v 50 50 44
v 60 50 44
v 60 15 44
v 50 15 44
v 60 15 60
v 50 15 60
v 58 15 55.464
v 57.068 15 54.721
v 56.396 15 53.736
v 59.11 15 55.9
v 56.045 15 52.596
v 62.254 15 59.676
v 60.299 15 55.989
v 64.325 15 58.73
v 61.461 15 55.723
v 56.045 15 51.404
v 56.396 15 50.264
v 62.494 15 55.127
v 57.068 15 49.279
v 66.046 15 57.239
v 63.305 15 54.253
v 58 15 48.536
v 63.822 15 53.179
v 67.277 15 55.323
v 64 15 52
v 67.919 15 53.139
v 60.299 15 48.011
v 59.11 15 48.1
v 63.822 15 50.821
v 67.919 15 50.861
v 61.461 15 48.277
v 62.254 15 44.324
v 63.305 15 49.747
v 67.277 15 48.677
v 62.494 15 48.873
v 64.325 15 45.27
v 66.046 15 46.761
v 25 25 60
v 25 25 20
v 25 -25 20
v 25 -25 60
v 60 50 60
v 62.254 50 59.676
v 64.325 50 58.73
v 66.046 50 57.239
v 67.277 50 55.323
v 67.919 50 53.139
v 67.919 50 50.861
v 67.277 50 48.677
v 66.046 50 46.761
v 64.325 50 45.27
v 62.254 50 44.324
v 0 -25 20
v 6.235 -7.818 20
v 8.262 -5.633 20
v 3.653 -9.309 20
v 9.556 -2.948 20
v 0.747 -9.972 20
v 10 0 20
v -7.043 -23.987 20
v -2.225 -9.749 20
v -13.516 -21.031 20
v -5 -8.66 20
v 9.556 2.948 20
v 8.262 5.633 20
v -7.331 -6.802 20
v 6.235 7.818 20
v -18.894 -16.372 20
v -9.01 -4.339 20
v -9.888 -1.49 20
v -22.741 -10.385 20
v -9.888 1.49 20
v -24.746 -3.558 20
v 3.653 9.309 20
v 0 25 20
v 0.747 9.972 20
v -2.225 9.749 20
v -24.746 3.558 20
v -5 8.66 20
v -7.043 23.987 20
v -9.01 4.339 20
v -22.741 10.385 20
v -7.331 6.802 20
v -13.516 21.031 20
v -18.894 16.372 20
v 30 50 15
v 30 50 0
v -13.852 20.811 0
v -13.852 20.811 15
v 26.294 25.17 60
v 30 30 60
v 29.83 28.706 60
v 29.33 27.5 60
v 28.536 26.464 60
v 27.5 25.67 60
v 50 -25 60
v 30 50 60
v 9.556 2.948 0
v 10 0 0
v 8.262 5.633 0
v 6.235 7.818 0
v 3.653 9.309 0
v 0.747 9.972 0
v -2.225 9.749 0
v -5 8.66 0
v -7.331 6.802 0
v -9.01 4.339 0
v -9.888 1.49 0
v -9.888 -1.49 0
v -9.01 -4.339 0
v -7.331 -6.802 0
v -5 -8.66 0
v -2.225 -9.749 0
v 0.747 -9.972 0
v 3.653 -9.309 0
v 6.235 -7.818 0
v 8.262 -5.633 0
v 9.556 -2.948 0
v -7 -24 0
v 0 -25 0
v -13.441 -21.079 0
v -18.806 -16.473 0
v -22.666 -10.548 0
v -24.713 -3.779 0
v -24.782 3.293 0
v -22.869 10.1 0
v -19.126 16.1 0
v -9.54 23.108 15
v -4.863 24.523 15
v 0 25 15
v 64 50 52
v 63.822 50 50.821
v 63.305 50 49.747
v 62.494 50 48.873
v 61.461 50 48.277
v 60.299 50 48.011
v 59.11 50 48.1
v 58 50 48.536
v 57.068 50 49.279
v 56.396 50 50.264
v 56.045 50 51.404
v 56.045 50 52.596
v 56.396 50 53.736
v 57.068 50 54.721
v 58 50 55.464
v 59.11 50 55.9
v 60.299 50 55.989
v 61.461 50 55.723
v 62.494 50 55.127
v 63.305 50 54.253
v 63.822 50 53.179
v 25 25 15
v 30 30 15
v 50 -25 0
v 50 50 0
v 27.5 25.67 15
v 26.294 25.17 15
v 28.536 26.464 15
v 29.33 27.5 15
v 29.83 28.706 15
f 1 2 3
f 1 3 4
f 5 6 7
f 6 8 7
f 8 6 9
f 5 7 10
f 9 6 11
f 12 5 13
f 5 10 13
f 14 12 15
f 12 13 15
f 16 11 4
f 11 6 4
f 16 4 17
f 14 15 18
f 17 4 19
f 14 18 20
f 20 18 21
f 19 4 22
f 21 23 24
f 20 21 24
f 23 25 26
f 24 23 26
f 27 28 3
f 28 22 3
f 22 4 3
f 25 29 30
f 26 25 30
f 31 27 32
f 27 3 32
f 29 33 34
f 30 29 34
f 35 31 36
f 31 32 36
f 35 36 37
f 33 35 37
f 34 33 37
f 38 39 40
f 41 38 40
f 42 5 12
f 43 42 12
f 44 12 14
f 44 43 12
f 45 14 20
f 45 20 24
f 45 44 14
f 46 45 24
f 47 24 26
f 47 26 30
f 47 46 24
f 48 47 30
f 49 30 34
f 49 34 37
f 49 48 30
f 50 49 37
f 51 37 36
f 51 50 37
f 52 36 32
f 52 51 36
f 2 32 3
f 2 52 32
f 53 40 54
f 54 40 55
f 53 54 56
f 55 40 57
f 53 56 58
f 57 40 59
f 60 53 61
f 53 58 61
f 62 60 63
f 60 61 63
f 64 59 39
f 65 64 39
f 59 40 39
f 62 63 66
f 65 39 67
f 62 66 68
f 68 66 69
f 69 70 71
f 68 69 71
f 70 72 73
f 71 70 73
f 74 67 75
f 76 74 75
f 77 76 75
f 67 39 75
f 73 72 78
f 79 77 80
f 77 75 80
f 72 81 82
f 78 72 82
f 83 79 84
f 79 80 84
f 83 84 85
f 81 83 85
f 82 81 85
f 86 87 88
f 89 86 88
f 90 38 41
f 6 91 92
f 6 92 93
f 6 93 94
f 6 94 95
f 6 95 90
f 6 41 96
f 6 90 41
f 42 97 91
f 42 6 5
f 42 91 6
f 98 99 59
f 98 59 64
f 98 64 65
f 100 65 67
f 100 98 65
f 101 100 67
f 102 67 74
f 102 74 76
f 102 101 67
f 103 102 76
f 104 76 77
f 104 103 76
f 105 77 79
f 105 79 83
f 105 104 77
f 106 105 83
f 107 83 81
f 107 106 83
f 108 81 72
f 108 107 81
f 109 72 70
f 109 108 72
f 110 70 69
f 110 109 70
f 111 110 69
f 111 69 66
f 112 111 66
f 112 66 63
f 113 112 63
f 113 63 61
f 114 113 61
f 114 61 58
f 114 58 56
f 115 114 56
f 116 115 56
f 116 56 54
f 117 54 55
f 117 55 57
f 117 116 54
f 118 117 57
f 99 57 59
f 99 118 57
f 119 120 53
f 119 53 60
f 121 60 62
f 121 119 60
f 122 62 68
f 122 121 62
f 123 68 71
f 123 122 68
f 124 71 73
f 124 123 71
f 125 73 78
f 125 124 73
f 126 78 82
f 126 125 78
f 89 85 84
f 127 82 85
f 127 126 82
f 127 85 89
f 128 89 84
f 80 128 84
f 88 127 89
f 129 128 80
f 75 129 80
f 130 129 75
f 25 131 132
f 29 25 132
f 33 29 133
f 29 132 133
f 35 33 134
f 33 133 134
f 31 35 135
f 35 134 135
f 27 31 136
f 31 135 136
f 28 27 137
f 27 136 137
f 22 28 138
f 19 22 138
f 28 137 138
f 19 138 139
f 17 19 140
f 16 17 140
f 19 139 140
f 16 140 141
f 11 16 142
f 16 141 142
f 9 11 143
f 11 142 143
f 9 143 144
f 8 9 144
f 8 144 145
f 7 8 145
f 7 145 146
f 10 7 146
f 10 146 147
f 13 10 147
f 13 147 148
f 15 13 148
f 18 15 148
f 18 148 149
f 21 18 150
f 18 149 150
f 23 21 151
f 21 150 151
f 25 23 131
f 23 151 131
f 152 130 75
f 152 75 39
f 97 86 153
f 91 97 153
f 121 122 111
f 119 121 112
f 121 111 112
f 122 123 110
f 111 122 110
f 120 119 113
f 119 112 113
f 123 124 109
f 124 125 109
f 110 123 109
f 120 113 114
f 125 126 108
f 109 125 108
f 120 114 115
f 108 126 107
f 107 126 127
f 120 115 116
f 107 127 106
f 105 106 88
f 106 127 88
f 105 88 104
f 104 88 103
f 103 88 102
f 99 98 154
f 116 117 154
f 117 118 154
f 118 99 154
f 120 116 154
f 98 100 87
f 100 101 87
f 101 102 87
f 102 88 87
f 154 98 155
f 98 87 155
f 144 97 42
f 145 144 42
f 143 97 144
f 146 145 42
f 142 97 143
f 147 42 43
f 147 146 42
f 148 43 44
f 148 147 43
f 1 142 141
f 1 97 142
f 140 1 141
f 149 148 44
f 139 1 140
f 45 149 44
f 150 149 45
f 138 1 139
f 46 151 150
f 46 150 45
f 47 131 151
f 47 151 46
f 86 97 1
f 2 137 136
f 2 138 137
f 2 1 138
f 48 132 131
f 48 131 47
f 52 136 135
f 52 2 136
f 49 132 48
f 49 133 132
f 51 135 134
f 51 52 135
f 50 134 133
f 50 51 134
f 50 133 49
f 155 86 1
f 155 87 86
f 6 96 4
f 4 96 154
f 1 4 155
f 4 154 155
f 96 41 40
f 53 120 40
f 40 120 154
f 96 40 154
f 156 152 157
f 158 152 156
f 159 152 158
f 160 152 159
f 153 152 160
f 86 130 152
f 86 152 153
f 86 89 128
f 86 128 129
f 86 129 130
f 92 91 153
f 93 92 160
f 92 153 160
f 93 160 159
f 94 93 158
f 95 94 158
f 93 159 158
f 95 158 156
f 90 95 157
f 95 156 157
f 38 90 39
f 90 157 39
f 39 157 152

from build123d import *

# Parameters (mm, degrees)
SKETCH1_R           = 10
BOSS_EXTRUDE1_DEPTH = 20
BOSS_EXTRUDE2_START = 20
BOSS_EXTRUDE2_DEPTH = 40
BOSS_EXTRUDE3_DEPTH = 15
SKETCH2_R           = 4
BOSS_EXTRUDE4_DEPTH = 35


with BuildPart() as part:
    # Sketch1 → Boss-Extrude1 (new body)
    with BuildSketch(Plane.XY):
        with BuildLine():
            ThreePointArc((0, -25), (-25, 0), (0, 25))
            Line((0, 25), (25, 25))
            Line((25, 25), (25, -25))
            Line((25, -25), (0, -25))
        make_face()
        Circle(SKETCH1_R, mode=Mode.SUBTRACT)
        with BuildLine():
            ThreePointArc((30, 30), (28.535533906, 26.464466094), (25, 25))
            Line((25, 25), (25, -25))
            Line((25, -25), (50, -25))
            Line((50, -25), (50, 15))
            Line((50, 15), (50, 50))
            Line((50, 50), (30, 50))
            Line((30, 50), (30, 30))
        make_face()
    extrude(amount=BOSS_EXTRUDE1_DEPTH)

    # Sketch1<3> → Boss-Extrude2 (add)
    with BuildSketch(Plane.XY.offset(BOSS_EXTRUDE2_START)):
        with BuildLine():
            ThreePointArc((30, 30), (28.535533906, 26.464466094), (25, 25))
            Line((25, 25), (25, -25))
            Line((25, -25), (50, -25))
            Line((50, -25), (50, 15))
            Line((50, 15), (50, 50))
            Line((50, 50), (30, 50))
            Line((30, 50), (30, 30))
        make_face()
    extrude(amount=BOSS_EXTRUDE2_DEPTH)

    # Sketch1<4> → Boss-Extrude3 (add)
    with BuildSketch(Plane.XY):
        with BuildLine():
            ThreePointArc((-13.852304693, 20.811382816), (-7.2358631, 23.929945365), (0, 25))
            Line((0, 25), (25, 25))
            ThreePointArc((25, 25), (28.535533906, 26.464466094), (30, 30))
            Line((30, 30), (30, 50))
            Line((30, 50), (-13.852304693, 20.811382816))
        make_face()
    extrude(amount=BOSS_EXTRUDE3_DEPTH)

    # Sketch2 → Boss-Extrude4 (add)
    with BuildSketch(Plane(origin=(0, 50, 0), x_dir=(1, 0, 0), z_dir=(0, 1, 0))):
        with BuildLine():
            Line((60, -44), (50, -44))
            Line((50, -44), (50, -60))
            Line((50, -60), (60, -60))
            ThreePointArc((60, -60), (68, -52), (60, -44))
        make_face()
        with Locations((60, -52)):
            Circle(SKETCH2_R, mode=Mode.SUBTRACT)
    extrude(amount=-BOSS_EXTRUDE4_DEPTH)


solid = part.part
